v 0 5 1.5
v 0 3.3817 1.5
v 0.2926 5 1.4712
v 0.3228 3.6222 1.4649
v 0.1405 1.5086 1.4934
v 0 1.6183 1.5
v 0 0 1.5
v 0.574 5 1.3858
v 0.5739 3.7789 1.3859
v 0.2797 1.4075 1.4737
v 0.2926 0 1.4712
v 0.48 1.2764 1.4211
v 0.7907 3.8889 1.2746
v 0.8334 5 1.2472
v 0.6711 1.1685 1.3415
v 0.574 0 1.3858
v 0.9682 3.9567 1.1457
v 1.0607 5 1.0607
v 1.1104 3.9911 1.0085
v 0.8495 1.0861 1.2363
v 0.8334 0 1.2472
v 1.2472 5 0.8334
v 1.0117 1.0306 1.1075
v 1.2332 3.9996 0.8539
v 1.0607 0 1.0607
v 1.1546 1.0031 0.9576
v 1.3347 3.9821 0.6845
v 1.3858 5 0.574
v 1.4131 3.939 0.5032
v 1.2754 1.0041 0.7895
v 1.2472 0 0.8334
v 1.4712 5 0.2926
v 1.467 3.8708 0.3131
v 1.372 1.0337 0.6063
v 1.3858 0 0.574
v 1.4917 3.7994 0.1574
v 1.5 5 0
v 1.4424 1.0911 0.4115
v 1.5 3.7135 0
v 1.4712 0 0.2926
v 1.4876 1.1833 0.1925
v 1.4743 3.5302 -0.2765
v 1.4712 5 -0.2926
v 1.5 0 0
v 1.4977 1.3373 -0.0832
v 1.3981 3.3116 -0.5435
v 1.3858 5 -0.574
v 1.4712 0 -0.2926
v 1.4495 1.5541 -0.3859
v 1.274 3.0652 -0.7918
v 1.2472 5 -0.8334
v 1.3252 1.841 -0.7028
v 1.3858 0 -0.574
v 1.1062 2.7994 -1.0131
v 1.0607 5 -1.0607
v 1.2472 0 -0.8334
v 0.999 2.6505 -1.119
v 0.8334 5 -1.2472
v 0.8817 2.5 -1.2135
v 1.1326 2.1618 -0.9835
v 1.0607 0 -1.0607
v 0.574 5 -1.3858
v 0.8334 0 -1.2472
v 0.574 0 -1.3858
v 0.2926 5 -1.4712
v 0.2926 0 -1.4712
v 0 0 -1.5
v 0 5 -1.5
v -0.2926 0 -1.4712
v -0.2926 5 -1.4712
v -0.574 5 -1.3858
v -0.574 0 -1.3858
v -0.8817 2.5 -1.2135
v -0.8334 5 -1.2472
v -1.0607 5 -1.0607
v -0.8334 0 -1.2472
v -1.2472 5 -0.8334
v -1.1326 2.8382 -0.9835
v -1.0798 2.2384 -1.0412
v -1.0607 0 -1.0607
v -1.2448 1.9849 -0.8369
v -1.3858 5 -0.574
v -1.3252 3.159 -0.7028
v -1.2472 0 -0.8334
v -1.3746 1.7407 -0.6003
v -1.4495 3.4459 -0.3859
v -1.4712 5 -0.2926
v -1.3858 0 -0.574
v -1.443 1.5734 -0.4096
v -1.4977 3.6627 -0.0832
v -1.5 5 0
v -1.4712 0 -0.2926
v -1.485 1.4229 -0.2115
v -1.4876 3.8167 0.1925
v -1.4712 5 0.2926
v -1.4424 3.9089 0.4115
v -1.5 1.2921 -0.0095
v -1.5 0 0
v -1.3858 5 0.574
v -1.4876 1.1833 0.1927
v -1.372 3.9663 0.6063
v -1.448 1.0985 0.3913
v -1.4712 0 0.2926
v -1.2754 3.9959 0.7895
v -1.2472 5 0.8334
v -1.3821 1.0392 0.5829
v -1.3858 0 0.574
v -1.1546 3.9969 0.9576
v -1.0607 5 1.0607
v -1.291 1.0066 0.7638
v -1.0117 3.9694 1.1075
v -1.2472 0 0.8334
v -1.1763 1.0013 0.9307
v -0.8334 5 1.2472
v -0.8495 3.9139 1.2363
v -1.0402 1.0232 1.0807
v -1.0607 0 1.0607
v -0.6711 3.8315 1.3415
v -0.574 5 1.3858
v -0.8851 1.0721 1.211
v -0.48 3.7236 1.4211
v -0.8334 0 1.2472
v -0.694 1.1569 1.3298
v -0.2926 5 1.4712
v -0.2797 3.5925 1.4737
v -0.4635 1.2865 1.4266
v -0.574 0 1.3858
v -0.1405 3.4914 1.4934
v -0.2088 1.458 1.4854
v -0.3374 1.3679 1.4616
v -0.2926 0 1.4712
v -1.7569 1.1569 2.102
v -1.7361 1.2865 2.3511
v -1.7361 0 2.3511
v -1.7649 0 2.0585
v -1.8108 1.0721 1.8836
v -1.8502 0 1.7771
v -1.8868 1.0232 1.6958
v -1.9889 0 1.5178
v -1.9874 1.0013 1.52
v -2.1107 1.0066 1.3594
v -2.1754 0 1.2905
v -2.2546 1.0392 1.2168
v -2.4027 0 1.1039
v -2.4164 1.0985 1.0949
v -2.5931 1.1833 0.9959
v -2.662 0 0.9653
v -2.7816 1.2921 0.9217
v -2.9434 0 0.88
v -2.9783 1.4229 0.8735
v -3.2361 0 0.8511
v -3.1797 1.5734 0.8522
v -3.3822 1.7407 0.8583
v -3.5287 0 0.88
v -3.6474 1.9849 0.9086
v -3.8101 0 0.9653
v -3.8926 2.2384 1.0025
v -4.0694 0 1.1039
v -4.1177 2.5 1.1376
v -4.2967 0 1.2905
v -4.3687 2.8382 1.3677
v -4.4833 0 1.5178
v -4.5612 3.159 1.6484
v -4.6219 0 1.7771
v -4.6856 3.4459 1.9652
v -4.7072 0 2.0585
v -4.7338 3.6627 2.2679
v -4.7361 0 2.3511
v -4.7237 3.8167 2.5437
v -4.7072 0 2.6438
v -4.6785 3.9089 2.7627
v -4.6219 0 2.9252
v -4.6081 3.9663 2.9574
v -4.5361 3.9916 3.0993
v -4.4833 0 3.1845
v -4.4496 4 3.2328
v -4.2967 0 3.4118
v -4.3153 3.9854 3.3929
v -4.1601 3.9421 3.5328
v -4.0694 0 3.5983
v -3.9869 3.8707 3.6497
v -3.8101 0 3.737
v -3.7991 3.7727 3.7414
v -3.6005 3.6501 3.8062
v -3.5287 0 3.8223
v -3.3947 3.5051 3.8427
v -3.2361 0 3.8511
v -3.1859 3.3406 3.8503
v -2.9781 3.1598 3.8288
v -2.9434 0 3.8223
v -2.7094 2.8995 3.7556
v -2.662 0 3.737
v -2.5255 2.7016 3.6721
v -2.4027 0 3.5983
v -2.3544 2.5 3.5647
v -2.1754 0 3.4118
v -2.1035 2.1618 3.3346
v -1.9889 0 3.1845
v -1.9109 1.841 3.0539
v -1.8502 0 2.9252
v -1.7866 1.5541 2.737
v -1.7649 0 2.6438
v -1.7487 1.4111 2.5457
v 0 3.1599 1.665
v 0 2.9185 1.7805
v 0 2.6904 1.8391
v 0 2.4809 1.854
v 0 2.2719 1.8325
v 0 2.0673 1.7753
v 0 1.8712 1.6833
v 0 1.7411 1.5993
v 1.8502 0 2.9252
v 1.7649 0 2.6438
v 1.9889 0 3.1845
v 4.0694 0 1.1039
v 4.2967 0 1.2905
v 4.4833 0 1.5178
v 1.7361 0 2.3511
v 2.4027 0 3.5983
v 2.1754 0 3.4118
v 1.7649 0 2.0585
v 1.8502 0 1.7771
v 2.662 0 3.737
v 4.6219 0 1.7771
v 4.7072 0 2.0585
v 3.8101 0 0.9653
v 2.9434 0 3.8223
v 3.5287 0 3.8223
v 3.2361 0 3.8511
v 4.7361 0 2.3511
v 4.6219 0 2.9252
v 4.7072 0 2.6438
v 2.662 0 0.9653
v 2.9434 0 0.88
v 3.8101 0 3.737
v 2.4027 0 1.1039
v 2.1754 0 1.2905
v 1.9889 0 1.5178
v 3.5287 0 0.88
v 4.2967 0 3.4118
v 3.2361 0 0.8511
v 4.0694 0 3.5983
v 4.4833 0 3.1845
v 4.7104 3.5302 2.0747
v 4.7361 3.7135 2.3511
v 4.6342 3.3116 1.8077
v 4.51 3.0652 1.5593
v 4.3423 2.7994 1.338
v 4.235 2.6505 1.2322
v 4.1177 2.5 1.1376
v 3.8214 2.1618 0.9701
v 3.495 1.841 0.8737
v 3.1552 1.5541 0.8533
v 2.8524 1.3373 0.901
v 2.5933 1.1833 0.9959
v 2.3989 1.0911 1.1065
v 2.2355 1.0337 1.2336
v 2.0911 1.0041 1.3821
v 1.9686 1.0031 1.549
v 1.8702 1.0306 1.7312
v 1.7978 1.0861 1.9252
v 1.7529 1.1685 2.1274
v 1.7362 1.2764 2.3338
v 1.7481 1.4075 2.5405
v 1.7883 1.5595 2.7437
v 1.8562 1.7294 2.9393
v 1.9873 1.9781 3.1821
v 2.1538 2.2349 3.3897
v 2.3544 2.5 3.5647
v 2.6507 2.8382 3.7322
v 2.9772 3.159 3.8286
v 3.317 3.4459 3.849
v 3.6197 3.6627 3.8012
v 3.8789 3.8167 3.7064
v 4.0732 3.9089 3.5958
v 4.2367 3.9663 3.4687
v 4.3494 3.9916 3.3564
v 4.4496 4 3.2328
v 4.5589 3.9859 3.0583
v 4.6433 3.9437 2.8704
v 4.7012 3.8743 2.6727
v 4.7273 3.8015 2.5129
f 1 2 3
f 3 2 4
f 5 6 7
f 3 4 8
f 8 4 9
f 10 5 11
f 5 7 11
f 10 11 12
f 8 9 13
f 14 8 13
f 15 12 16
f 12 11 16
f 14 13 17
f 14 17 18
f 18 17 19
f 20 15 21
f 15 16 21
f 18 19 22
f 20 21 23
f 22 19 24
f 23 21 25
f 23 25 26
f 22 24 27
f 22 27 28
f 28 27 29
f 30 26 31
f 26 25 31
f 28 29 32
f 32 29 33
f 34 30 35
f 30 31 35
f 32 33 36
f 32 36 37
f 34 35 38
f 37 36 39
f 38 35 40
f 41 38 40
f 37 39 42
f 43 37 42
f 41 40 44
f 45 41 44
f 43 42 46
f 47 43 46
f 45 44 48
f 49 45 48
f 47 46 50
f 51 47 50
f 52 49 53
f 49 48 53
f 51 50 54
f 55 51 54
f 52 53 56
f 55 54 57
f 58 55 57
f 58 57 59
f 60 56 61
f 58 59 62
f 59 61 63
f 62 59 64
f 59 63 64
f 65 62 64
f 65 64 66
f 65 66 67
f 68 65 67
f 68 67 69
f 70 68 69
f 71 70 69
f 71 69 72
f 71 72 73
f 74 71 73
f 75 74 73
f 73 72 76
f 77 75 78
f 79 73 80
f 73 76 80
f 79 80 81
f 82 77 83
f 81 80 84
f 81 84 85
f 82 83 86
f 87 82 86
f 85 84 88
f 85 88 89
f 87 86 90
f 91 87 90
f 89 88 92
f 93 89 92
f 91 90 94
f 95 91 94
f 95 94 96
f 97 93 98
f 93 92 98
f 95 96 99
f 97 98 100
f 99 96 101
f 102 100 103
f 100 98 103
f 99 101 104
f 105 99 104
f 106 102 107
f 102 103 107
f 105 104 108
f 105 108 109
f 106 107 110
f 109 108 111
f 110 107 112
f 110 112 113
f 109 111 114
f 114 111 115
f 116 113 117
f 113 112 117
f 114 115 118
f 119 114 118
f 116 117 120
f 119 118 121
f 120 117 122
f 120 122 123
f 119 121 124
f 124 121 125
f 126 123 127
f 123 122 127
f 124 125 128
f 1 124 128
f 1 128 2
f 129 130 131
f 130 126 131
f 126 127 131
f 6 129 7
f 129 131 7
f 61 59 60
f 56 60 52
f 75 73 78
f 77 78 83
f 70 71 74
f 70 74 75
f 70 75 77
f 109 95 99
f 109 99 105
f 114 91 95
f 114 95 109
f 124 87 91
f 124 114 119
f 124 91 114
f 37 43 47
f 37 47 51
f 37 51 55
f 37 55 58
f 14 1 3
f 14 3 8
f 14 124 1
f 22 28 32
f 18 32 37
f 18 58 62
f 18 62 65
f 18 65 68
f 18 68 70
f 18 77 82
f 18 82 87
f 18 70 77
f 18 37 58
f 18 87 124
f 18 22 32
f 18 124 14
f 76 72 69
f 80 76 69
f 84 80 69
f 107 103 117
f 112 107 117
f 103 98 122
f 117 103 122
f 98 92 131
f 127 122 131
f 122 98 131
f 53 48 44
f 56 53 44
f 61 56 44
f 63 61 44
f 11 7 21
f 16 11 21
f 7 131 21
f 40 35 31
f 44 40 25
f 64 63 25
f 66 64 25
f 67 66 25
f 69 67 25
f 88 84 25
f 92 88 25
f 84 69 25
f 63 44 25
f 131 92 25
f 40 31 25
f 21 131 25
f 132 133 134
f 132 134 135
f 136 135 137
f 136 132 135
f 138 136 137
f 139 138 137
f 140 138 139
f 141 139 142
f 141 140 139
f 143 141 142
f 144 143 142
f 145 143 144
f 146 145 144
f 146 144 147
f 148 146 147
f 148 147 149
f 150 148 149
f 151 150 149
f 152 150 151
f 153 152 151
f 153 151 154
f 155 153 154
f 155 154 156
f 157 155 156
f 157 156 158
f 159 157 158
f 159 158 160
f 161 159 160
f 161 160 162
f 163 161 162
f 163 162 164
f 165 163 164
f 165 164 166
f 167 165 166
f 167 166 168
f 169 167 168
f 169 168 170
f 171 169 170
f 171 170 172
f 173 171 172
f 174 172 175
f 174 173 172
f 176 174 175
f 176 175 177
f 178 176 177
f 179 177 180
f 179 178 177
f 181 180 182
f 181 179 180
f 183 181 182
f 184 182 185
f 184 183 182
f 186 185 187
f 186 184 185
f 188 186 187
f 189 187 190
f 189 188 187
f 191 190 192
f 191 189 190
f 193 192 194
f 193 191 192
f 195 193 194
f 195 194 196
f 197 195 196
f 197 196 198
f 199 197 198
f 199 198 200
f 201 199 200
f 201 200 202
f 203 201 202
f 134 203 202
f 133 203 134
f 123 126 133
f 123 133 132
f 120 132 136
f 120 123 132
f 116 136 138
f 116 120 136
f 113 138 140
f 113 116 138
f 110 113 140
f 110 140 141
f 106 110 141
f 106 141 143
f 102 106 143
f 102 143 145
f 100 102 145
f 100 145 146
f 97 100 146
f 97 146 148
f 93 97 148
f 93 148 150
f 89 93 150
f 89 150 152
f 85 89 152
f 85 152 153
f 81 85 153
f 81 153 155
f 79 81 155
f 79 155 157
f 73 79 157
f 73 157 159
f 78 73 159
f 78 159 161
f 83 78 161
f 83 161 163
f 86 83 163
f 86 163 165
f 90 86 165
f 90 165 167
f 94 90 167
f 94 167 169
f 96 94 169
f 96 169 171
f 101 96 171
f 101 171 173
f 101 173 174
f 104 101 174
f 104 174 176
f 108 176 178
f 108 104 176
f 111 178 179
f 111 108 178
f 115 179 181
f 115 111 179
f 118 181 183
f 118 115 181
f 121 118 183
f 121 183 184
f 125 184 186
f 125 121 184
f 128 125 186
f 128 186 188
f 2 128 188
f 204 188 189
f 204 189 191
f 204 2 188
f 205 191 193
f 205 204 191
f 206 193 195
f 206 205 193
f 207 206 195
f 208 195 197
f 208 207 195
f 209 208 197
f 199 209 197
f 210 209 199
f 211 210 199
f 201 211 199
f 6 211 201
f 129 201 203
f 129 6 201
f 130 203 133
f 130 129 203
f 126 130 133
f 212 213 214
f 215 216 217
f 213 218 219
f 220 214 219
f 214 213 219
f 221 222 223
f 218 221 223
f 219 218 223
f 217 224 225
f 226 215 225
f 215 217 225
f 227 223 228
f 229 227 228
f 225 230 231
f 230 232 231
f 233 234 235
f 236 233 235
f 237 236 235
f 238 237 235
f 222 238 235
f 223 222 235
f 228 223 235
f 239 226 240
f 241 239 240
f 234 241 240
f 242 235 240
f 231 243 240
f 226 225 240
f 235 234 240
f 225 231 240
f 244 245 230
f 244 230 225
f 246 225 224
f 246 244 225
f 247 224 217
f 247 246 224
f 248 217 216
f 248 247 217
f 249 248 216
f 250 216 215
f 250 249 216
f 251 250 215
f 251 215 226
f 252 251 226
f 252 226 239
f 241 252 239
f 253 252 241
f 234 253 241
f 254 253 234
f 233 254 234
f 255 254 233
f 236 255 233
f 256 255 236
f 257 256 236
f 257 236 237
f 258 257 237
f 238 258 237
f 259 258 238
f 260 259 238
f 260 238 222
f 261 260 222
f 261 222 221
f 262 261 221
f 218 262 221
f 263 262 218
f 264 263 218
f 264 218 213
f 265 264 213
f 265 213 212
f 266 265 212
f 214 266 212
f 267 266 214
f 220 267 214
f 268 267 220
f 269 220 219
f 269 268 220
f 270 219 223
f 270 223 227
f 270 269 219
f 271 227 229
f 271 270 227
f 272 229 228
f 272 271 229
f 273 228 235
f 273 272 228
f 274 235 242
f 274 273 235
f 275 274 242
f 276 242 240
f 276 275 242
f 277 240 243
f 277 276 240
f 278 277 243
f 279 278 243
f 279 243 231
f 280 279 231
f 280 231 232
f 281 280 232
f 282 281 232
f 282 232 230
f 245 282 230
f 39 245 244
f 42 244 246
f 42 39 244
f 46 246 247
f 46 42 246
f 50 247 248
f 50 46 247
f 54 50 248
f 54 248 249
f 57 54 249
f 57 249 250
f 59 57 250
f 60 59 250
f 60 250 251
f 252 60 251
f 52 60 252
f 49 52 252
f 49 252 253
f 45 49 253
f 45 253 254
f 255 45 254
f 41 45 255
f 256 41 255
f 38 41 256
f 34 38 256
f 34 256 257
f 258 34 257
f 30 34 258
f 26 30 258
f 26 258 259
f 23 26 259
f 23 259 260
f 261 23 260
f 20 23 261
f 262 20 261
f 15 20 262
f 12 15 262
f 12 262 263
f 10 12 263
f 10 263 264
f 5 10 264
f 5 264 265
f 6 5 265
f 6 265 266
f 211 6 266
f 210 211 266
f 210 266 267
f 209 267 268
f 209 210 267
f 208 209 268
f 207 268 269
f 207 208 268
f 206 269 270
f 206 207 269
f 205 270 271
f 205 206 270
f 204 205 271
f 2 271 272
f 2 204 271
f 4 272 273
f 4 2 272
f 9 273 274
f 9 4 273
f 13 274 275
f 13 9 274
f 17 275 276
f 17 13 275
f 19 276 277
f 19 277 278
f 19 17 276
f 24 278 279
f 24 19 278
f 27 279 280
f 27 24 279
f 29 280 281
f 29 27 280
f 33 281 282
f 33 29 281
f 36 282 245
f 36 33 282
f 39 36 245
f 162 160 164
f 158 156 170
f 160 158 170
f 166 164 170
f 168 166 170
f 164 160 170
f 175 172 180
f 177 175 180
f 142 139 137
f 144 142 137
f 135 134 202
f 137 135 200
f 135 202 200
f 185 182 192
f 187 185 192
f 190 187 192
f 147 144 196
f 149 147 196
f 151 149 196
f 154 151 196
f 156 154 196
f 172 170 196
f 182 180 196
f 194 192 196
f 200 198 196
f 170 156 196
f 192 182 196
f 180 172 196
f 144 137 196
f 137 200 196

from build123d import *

# Parameters (mm, degrees)
SKETCH2_R           = 1.5
SKETCH5_R           = 1.5
SKETCH1_R           = 1.5
BOSS_EXTRUDE1_DEPTH = 5


with BuildPart() as part:
    # Sweep1: sweep along a path in Sketch3
    with BuildLine(Plane(origin=(0, 0, 0), x_dir=(-0.8090169943749461, 0, 0.5877852522924749), z_dir=(-0.5877852522924749, 0, -0.8090169943749461))) as sweep1_path:
        Line((4, 0), (4, 2.5))
        Line((4, 2.5), (0, 2.5))
    # Sketch2 → Sweep1 (sweep)
    with BuildSketch(Plane(origin=(0, 0, 0), x_dir=(1, 0, 0), z_dir=(0, 1, 0))):
        with Locations((-3.236067977, -2.351141009)):
            Circle(SKETCH2_R)
    sweep(path=sweep1_path.line, transition=Transition.RIGHT)

    # Sweep2: sweep along a path in Sketch6
    with BuildLine(Plane(origin=(0, 0, 0), x_dir=(0.8090169943749507, 0, 0.5877852522924687), z_dir=(-0.5877852522924687, 0, 0.8090169943749507))) as sweep2_path:
        Line((4, 0), (4, 2.5))
        Line((4, 2.5), (0, 2.5))
    # Sketch5 → Sweep2 (sweep)
    with BuildSketch(Plane(origin=(0, 0, 0), x_dir=(1, 0, 0), z_dir=(0, 1, 0))):
        with Locations((3.236067977, -2.351141009)):
            Circle(SKETCH5_R)
    sweep(path=sweep2_path.line, transition=Transition.RIGHT)

    # Sketch1 → Boss-Extrude1 (add)
    with BuildSketch(Plane(origin=(0, 0, 0), x_dir=(1, 0, 0), z_dir=(0, 1, 0))):
        with Locations(Location((0, 0, 0), (0, 0, 270))):
            Circle(SKETCH1_R)
    extrude(amount=BOSS_EXTRUDE1_DEPTH)


solid = part.part
